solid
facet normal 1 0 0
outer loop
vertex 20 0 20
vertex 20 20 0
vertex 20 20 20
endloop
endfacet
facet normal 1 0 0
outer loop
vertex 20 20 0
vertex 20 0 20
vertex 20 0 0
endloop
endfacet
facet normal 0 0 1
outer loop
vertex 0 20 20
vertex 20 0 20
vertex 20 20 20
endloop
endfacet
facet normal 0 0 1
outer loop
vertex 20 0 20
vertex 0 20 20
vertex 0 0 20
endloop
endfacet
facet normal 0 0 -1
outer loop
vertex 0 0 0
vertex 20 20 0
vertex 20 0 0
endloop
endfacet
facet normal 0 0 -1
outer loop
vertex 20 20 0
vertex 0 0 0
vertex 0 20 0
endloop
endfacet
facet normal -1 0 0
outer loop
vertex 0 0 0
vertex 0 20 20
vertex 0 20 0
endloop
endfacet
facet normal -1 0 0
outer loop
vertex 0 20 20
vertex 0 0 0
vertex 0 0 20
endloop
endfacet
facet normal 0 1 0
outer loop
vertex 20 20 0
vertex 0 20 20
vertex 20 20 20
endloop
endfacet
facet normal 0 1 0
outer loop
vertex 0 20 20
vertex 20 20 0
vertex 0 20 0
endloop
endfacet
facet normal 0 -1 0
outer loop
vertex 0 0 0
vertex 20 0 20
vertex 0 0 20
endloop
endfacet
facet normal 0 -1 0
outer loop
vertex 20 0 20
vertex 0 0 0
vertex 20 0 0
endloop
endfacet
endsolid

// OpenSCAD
$fn = 50;difference() {
	union() {
		cube(size = [20, 20, 20]);
	}
	union();
}
